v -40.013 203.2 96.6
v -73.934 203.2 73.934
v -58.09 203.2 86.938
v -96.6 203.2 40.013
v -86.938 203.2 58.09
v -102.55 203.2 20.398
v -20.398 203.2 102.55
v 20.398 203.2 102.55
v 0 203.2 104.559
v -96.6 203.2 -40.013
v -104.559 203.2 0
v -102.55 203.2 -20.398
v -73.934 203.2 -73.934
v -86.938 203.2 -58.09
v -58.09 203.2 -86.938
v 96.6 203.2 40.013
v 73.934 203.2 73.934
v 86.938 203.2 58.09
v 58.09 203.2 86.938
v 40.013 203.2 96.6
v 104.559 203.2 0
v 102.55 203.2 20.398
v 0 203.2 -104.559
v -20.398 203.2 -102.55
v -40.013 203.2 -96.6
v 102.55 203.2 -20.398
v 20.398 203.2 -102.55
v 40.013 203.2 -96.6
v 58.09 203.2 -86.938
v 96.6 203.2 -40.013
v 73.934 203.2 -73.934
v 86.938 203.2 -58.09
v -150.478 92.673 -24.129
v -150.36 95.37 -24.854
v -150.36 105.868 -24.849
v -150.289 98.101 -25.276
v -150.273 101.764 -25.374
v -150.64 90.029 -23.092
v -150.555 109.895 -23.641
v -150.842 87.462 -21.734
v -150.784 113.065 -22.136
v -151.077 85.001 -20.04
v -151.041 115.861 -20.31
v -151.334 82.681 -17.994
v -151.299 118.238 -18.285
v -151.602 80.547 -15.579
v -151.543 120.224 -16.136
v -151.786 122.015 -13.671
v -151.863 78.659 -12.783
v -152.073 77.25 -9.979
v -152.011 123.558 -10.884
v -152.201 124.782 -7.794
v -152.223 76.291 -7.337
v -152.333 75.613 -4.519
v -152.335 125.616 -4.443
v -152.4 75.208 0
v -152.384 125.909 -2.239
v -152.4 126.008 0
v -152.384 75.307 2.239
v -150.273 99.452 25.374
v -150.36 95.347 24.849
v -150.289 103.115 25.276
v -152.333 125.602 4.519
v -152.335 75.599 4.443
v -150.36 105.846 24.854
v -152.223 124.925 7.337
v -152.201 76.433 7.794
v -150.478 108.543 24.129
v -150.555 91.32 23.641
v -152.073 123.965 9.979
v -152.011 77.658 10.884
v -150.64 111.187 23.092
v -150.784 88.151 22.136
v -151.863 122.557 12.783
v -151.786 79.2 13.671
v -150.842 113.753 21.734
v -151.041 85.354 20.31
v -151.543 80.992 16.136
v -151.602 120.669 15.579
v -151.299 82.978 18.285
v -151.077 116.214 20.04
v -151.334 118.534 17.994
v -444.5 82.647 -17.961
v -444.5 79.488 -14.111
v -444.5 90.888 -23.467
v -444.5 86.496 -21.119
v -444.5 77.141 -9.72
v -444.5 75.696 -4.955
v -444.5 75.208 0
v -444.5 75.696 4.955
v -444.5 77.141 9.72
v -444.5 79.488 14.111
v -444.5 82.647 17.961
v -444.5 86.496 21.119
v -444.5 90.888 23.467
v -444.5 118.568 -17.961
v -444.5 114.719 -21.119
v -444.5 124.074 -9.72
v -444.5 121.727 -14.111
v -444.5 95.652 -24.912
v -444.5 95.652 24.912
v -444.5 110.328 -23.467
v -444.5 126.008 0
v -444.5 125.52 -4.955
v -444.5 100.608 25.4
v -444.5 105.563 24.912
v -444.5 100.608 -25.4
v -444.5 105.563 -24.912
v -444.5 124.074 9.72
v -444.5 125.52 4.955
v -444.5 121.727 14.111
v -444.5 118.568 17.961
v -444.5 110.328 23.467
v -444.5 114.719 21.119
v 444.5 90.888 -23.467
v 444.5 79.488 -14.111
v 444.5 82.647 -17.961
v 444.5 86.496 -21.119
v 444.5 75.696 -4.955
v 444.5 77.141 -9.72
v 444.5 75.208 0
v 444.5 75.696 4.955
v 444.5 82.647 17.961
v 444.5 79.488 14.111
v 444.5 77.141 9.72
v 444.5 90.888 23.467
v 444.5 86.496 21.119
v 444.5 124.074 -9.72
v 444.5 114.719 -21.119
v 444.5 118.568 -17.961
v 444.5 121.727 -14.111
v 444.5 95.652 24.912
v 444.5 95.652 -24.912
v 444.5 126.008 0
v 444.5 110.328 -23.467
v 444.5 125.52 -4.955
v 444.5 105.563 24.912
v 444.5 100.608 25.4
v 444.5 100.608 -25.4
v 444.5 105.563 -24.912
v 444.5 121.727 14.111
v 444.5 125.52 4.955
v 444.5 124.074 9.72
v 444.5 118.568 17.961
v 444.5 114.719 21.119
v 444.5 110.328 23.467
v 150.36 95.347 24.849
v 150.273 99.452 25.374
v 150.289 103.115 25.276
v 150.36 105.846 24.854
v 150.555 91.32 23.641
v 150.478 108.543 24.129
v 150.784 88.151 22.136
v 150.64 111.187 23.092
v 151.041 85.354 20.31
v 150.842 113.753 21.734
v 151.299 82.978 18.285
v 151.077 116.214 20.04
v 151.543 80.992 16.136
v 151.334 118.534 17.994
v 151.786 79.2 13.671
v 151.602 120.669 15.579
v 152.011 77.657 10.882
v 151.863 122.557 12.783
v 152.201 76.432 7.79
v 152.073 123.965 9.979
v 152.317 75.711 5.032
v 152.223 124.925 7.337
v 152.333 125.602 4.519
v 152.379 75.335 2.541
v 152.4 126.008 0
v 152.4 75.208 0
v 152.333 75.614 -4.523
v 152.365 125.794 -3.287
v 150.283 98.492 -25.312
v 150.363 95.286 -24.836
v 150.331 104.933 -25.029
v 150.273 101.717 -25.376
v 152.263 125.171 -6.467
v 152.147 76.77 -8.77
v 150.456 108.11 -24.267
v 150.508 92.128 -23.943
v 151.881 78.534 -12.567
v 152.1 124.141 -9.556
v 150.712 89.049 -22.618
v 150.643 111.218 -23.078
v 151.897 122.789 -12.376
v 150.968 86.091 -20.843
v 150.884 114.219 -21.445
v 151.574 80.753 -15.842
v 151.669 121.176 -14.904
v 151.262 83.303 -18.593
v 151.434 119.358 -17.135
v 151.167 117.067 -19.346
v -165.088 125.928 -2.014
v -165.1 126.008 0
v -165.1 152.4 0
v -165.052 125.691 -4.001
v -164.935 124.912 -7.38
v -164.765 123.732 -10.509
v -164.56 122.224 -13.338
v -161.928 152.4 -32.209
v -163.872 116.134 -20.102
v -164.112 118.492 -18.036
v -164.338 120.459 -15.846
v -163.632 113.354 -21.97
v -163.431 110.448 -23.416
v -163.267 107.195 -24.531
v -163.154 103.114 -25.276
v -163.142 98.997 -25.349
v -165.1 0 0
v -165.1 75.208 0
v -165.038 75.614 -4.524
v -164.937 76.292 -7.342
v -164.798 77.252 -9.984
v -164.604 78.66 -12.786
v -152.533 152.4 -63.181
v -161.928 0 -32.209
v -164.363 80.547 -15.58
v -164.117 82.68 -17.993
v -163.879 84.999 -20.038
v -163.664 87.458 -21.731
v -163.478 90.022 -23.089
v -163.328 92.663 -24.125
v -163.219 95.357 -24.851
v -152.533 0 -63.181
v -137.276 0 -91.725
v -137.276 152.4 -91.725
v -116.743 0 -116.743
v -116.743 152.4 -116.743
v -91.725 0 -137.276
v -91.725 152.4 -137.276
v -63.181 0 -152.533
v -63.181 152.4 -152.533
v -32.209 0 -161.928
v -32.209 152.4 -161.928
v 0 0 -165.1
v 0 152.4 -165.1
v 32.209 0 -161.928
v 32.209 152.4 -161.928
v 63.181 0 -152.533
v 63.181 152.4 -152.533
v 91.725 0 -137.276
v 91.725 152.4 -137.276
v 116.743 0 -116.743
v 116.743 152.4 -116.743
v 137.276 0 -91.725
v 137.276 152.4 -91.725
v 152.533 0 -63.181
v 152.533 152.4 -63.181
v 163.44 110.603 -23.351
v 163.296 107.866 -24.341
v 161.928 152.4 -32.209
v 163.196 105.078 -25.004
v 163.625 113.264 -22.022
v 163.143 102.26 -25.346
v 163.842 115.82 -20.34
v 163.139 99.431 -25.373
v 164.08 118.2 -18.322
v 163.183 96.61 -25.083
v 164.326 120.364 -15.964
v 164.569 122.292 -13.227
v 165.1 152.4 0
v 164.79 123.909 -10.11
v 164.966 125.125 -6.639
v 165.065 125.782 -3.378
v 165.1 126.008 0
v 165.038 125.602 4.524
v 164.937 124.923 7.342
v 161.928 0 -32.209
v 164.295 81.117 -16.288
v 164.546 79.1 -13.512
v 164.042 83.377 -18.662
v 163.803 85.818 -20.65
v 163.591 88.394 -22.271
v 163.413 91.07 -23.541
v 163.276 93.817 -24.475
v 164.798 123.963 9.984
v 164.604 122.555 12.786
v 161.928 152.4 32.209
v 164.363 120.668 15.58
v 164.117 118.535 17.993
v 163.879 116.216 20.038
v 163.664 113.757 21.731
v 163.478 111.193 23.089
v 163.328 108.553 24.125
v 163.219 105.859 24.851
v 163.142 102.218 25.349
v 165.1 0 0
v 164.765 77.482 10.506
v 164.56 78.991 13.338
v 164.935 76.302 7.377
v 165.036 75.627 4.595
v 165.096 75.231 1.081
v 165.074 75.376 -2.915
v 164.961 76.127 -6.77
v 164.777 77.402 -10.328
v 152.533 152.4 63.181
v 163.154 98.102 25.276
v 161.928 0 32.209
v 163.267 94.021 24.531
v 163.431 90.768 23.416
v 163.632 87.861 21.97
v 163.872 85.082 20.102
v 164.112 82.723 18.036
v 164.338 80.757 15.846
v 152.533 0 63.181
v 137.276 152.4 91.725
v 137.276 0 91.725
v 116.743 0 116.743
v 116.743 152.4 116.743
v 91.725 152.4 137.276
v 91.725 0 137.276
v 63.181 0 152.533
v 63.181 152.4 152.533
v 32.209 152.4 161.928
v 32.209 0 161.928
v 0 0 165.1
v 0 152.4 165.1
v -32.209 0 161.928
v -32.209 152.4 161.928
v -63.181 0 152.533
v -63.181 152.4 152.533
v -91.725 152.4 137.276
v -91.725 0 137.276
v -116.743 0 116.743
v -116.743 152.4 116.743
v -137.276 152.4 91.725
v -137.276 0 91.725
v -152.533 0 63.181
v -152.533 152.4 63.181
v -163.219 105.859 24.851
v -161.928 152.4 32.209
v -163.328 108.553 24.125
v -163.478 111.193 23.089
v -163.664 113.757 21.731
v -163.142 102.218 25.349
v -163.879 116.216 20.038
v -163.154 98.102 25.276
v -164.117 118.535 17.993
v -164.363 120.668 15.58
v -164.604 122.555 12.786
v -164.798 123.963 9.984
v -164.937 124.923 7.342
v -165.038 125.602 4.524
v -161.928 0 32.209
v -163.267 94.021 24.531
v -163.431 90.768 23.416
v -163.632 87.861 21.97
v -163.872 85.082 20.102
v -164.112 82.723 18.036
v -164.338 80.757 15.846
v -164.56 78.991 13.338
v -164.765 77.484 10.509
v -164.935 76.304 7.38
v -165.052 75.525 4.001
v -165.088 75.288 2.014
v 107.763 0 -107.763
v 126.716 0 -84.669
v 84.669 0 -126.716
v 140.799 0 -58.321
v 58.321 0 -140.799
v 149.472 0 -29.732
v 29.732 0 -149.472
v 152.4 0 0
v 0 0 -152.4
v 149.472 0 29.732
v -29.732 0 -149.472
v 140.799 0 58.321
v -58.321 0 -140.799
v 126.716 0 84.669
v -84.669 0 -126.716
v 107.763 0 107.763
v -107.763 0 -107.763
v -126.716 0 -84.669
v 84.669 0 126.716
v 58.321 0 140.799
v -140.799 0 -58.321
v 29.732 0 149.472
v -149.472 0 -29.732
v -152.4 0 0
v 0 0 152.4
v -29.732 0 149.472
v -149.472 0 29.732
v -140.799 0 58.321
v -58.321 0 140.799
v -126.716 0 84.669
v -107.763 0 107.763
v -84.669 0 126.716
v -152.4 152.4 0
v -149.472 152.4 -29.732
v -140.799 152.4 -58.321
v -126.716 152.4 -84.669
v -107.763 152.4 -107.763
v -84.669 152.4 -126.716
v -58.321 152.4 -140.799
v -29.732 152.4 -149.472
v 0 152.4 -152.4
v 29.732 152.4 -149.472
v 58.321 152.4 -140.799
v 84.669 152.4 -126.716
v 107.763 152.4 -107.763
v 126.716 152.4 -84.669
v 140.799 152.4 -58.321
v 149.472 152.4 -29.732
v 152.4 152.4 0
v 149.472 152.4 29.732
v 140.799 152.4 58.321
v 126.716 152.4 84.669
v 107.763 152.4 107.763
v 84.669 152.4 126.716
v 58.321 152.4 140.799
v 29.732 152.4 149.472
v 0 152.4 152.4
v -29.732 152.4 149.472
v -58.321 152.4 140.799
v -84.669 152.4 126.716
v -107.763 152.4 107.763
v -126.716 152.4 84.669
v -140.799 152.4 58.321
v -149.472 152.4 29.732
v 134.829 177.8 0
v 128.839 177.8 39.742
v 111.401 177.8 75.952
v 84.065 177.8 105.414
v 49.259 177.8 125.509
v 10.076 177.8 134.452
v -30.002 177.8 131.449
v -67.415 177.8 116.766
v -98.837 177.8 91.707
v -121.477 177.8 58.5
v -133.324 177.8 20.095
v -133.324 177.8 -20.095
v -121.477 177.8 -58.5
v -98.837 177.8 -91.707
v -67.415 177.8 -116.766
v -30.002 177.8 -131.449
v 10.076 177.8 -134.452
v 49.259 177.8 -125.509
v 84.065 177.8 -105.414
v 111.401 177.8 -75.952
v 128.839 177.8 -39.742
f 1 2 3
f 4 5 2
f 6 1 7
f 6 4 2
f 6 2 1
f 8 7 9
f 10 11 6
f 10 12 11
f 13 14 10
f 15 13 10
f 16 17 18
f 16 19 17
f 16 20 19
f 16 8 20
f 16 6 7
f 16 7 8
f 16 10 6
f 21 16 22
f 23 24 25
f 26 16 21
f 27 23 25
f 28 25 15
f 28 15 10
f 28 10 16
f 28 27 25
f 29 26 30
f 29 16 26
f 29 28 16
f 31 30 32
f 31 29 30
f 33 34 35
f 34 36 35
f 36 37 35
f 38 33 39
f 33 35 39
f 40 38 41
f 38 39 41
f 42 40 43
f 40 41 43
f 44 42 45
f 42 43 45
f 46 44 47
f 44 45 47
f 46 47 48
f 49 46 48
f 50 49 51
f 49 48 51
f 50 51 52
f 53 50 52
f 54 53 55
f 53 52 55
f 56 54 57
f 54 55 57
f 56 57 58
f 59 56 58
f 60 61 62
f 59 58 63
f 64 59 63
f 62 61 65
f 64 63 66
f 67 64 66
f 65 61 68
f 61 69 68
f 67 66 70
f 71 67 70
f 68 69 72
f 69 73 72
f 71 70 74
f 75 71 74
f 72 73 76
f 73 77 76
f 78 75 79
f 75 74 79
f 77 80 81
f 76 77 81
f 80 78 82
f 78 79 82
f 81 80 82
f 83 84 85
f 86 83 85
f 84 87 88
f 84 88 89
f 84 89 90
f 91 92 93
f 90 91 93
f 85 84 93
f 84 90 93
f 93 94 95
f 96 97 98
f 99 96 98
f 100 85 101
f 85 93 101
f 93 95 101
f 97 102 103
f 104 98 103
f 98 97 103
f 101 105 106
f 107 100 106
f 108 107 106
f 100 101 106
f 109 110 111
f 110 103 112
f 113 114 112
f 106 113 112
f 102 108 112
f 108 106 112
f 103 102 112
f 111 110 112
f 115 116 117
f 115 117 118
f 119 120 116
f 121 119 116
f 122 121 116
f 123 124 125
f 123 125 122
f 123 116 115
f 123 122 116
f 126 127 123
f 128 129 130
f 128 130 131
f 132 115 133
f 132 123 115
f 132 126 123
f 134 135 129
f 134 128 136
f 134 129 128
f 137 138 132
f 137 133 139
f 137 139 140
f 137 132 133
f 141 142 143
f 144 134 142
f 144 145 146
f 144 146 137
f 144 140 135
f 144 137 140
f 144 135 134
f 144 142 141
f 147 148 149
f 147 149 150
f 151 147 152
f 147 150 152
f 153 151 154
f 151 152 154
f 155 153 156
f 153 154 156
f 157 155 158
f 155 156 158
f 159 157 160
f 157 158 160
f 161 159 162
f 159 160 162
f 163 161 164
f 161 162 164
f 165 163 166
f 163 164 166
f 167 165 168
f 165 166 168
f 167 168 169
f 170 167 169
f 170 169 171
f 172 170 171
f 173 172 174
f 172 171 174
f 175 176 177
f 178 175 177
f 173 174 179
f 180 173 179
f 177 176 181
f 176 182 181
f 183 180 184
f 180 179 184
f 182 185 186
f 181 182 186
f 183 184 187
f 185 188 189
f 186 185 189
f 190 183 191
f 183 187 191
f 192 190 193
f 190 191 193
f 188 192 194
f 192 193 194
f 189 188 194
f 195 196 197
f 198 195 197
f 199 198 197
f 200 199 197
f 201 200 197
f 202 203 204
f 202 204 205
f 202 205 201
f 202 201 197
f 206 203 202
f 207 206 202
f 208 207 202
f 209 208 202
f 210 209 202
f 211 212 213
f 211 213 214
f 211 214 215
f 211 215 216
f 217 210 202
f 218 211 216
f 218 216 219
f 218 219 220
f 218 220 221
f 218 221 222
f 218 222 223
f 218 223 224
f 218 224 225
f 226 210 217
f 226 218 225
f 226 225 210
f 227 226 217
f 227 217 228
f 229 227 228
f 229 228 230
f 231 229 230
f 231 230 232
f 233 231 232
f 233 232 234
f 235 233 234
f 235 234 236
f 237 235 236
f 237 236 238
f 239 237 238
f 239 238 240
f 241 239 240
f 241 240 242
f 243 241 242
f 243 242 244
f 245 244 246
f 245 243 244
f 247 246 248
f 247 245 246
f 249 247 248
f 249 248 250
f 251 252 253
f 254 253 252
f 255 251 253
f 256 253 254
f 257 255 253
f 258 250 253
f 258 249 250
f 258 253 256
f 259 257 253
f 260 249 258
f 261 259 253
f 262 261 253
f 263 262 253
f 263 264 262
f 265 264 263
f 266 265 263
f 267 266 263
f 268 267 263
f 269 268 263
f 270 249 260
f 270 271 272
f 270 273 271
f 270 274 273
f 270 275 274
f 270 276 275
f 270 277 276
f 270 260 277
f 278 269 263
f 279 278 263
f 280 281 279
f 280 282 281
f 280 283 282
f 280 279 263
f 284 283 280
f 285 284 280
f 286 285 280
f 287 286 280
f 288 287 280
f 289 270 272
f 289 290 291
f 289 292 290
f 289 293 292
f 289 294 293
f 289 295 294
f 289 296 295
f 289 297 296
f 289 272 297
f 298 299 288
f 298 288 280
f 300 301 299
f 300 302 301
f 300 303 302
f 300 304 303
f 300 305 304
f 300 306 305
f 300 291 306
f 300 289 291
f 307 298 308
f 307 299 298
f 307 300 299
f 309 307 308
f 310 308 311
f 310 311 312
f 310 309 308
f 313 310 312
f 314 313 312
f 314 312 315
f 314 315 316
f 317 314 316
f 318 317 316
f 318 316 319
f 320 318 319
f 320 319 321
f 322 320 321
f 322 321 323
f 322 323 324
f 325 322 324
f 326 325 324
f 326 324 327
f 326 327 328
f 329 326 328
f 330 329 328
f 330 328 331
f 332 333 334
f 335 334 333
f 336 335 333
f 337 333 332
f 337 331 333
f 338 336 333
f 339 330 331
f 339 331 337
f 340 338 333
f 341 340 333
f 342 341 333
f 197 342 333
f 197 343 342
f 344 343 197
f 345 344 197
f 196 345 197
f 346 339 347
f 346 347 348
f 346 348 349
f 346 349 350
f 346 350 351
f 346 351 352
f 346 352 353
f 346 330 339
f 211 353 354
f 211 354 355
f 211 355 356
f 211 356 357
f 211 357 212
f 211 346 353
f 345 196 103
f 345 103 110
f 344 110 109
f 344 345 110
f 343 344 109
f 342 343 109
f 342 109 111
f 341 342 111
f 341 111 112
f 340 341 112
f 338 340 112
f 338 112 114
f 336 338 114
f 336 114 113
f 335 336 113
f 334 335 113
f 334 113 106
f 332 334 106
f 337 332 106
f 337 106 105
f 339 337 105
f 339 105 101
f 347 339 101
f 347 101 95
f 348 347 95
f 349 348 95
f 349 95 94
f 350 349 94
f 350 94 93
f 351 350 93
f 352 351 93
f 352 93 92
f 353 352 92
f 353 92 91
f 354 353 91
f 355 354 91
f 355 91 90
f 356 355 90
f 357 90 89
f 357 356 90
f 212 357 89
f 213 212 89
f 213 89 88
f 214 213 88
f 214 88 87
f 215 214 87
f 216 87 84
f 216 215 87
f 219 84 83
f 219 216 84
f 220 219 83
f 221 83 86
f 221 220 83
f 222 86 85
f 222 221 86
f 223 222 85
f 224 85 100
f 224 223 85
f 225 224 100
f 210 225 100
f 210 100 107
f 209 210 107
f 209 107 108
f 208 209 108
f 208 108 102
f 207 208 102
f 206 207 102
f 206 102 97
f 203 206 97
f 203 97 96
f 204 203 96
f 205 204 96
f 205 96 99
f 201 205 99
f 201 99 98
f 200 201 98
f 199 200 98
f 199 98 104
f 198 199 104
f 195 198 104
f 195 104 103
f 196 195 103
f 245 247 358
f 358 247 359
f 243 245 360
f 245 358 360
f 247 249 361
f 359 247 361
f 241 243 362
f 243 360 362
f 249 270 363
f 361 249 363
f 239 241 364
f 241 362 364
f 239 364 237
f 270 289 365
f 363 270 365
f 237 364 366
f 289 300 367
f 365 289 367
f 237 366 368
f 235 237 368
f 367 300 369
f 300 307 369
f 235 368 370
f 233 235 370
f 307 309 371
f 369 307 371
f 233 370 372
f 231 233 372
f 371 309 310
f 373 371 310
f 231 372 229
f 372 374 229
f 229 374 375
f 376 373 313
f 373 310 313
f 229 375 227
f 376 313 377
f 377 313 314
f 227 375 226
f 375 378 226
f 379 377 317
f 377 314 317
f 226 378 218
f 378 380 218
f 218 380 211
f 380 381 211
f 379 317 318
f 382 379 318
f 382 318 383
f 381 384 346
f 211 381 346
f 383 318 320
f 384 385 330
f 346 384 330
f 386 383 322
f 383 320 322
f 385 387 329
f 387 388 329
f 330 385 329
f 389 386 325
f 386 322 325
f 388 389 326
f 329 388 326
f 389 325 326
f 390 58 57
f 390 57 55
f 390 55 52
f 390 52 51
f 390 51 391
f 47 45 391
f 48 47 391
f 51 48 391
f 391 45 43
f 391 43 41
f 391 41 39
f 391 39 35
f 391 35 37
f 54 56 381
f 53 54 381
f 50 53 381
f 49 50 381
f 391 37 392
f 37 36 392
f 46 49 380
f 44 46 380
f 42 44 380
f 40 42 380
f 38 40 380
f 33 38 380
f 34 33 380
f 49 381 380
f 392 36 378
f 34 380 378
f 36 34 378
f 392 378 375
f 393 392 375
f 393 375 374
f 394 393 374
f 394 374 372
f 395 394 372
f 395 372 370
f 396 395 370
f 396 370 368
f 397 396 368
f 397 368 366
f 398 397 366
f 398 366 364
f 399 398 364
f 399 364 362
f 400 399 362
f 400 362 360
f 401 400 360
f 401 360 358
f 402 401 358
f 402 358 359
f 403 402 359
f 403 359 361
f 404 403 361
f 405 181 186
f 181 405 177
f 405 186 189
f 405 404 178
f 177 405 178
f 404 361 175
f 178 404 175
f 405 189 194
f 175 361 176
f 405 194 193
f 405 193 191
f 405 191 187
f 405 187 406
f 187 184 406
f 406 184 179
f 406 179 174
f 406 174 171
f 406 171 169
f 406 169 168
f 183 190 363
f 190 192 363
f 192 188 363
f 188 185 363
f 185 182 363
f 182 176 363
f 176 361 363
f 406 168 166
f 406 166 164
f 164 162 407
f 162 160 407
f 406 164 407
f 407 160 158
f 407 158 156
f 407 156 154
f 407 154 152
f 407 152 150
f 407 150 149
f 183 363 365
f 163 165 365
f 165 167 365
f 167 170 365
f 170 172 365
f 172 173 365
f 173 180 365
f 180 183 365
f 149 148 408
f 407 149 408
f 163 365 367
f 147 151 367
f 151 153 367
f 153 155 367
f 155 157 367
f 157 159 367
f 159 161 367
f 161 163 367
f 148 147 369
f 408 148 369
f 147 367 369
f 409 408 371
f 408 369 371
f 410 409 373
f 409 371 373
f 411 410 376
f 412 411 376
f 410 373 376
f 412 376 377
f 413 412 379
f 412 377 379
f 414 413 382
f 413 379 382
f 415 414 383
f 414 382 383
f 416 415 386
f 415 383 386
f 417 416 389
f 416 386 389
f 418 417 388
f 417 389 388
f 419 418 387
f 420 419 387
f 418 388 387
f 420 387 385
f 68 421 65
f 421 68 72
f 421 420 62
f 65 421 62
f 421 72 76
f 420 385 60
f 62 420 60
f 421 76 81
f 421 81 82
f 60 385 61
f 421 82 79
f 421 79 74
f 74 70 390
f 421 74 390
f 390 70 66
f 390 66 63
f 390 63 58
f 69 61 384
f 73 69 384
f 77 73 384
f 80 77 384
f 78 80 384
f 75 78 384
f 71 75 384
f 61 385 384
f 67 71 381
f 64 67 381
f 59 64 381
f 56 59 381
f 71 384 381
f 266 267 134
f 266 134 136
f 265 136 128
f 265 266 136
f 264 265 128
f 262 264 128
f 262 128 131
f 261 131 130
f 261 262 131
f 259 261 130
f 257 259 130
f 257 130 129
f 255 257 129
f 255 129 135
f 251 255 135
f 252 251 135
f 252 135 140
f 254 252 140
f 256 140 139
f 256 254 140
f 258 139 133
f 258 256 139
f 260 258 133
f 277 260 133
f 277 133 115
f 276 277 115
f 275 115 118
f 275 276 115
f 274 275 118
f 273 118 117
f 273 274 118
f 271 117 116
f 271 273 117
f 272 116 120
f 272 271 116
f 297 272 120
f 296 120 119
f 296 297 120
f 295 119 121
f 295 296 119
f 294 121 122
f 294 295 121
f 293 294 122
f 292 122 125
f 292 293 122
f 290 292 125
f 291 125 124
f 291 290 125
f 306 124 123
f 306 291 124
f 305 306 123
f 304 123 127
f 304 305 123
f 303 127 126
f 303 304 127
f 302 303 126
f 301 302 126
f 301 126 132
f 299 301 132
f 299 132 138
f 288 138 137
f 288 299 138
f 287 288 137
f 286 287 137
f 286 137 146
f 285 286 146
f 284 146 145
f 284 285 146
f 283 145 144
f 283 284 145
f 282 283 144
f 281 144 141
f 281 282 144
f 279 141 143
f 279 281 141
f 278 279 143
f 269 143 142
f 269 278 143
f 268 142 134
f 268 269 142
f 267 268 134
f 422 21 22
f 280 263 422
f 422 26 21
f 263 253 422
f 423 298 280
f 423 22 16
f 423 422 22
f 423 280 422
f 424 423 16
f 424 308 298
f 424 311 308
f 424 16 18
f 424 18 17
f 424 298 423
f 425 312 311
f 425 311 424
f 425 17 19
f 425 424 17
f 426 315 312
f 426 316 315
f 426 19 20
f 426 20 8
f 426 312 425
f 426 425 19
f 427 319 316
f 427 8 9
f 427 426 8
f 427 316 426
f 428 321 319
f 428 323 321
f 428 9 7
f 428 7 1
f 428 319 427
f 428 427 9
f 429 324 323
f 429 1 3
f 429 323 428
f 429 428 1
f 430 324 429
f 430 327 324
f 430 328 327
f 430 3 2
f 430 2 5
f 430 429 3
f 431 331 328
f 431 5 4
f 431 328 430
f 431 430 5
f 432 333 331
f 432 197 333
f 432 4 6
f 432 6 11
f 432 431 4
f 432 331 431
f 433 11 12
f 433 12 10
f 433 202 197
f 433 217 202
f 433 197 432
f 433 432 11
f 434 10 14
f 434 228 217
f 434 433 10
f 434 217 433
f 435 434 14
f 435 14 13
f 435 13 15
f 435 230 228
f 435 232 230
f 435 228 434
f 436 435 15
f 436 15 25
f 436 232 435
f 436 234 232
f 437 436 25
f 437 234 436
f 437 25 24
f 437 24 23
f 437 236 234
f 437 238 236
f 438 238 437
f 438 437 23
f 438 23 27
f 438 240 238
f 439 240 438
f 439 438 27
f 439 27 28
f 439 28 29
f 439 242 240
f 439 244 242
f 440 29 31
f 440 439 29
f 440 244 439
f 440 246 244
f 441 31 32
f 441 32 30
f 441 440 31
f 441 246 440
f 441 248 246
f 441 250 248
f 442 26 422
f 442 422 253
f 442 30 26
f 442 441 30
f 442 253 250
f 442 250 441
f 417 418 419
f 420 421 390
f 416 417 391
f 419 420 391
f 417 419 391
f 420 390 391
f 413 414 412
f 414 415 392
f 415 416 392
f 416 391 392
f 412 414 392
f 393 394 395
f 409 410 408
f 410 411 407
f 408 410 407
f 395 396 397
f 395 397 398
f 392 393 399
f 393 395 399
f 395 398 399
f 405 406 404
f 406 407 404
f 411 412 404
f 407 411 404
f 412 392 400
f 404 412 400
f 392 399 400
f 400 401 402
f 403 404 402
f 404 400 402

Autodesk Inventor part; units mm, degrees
ref_plane "YZ Plane" through (0, 0, 0) normal (1, 0, 0) x (0, 1, 0)
ref_plane "XZ Plane" through (0, 0, 0) normal (0, 1, 0) x (-1, 0, 0)
sketch "Sketch1" plane through (0, 0, 0) normal (0, 1, 0) x (-1, 0, 0)
  circle A0 centre (0, 0) radius 152.4
  circle A1 centre (0, 0) radius 165.1
  dimension "d0" = 304.8
  dimension "d1" = 330.2
extrude "Extrusion1" add sketch "Sketch1" along normal blind 152.4
sketch "Sketch2" plane through (0, 0, 0) normal (1, 0, 0) x (0, 1, 0)
  circle A0 centre (100.6077, 0) radius 25.4
  point P0 (0, 0)
  dimension "d4" = 50.8
extrude "Extrusion2" add sketch "Sketch2" along normal mid plane 889
sketch "Sketch4" plane through (0, 152.4, 0) normal (0, 1, 0) x (1, 0, 0)
  circle A0 centre (0, 0) radius 152.4
extrude "Extrusion4" cut sketch "Sketch4" against normal through all
sketch "Sketch5" plane through (0, 152.4, 0) normal (0, 1, 0) x (1, 0, 0)
  circle A0 centre (0, 0) radius 165.1
extrude "Extrusion5" add sketch "Sketch5" along normal blind 50.8 draft -50
ref_plane "Work Plane2" through (75.376, -18.8821, -44.9646) normal (1, 0, 0) x (0, 1, 0)
sketch "Sketch9" plane through (75.376, -18.8821, -44.9646) normal (1, 0, 0) x (0, 1, 0)
  circle A0 centre (-604.603, 44.9646) radius 12.7
  point P0 (18.8821, 44.9646)
  dimension "d25" = 25.4
extrude "Extrusion9" cut sketch "Sketch9" against normal through all
properties part number "CapstanTop-ver1-1111-2021"
